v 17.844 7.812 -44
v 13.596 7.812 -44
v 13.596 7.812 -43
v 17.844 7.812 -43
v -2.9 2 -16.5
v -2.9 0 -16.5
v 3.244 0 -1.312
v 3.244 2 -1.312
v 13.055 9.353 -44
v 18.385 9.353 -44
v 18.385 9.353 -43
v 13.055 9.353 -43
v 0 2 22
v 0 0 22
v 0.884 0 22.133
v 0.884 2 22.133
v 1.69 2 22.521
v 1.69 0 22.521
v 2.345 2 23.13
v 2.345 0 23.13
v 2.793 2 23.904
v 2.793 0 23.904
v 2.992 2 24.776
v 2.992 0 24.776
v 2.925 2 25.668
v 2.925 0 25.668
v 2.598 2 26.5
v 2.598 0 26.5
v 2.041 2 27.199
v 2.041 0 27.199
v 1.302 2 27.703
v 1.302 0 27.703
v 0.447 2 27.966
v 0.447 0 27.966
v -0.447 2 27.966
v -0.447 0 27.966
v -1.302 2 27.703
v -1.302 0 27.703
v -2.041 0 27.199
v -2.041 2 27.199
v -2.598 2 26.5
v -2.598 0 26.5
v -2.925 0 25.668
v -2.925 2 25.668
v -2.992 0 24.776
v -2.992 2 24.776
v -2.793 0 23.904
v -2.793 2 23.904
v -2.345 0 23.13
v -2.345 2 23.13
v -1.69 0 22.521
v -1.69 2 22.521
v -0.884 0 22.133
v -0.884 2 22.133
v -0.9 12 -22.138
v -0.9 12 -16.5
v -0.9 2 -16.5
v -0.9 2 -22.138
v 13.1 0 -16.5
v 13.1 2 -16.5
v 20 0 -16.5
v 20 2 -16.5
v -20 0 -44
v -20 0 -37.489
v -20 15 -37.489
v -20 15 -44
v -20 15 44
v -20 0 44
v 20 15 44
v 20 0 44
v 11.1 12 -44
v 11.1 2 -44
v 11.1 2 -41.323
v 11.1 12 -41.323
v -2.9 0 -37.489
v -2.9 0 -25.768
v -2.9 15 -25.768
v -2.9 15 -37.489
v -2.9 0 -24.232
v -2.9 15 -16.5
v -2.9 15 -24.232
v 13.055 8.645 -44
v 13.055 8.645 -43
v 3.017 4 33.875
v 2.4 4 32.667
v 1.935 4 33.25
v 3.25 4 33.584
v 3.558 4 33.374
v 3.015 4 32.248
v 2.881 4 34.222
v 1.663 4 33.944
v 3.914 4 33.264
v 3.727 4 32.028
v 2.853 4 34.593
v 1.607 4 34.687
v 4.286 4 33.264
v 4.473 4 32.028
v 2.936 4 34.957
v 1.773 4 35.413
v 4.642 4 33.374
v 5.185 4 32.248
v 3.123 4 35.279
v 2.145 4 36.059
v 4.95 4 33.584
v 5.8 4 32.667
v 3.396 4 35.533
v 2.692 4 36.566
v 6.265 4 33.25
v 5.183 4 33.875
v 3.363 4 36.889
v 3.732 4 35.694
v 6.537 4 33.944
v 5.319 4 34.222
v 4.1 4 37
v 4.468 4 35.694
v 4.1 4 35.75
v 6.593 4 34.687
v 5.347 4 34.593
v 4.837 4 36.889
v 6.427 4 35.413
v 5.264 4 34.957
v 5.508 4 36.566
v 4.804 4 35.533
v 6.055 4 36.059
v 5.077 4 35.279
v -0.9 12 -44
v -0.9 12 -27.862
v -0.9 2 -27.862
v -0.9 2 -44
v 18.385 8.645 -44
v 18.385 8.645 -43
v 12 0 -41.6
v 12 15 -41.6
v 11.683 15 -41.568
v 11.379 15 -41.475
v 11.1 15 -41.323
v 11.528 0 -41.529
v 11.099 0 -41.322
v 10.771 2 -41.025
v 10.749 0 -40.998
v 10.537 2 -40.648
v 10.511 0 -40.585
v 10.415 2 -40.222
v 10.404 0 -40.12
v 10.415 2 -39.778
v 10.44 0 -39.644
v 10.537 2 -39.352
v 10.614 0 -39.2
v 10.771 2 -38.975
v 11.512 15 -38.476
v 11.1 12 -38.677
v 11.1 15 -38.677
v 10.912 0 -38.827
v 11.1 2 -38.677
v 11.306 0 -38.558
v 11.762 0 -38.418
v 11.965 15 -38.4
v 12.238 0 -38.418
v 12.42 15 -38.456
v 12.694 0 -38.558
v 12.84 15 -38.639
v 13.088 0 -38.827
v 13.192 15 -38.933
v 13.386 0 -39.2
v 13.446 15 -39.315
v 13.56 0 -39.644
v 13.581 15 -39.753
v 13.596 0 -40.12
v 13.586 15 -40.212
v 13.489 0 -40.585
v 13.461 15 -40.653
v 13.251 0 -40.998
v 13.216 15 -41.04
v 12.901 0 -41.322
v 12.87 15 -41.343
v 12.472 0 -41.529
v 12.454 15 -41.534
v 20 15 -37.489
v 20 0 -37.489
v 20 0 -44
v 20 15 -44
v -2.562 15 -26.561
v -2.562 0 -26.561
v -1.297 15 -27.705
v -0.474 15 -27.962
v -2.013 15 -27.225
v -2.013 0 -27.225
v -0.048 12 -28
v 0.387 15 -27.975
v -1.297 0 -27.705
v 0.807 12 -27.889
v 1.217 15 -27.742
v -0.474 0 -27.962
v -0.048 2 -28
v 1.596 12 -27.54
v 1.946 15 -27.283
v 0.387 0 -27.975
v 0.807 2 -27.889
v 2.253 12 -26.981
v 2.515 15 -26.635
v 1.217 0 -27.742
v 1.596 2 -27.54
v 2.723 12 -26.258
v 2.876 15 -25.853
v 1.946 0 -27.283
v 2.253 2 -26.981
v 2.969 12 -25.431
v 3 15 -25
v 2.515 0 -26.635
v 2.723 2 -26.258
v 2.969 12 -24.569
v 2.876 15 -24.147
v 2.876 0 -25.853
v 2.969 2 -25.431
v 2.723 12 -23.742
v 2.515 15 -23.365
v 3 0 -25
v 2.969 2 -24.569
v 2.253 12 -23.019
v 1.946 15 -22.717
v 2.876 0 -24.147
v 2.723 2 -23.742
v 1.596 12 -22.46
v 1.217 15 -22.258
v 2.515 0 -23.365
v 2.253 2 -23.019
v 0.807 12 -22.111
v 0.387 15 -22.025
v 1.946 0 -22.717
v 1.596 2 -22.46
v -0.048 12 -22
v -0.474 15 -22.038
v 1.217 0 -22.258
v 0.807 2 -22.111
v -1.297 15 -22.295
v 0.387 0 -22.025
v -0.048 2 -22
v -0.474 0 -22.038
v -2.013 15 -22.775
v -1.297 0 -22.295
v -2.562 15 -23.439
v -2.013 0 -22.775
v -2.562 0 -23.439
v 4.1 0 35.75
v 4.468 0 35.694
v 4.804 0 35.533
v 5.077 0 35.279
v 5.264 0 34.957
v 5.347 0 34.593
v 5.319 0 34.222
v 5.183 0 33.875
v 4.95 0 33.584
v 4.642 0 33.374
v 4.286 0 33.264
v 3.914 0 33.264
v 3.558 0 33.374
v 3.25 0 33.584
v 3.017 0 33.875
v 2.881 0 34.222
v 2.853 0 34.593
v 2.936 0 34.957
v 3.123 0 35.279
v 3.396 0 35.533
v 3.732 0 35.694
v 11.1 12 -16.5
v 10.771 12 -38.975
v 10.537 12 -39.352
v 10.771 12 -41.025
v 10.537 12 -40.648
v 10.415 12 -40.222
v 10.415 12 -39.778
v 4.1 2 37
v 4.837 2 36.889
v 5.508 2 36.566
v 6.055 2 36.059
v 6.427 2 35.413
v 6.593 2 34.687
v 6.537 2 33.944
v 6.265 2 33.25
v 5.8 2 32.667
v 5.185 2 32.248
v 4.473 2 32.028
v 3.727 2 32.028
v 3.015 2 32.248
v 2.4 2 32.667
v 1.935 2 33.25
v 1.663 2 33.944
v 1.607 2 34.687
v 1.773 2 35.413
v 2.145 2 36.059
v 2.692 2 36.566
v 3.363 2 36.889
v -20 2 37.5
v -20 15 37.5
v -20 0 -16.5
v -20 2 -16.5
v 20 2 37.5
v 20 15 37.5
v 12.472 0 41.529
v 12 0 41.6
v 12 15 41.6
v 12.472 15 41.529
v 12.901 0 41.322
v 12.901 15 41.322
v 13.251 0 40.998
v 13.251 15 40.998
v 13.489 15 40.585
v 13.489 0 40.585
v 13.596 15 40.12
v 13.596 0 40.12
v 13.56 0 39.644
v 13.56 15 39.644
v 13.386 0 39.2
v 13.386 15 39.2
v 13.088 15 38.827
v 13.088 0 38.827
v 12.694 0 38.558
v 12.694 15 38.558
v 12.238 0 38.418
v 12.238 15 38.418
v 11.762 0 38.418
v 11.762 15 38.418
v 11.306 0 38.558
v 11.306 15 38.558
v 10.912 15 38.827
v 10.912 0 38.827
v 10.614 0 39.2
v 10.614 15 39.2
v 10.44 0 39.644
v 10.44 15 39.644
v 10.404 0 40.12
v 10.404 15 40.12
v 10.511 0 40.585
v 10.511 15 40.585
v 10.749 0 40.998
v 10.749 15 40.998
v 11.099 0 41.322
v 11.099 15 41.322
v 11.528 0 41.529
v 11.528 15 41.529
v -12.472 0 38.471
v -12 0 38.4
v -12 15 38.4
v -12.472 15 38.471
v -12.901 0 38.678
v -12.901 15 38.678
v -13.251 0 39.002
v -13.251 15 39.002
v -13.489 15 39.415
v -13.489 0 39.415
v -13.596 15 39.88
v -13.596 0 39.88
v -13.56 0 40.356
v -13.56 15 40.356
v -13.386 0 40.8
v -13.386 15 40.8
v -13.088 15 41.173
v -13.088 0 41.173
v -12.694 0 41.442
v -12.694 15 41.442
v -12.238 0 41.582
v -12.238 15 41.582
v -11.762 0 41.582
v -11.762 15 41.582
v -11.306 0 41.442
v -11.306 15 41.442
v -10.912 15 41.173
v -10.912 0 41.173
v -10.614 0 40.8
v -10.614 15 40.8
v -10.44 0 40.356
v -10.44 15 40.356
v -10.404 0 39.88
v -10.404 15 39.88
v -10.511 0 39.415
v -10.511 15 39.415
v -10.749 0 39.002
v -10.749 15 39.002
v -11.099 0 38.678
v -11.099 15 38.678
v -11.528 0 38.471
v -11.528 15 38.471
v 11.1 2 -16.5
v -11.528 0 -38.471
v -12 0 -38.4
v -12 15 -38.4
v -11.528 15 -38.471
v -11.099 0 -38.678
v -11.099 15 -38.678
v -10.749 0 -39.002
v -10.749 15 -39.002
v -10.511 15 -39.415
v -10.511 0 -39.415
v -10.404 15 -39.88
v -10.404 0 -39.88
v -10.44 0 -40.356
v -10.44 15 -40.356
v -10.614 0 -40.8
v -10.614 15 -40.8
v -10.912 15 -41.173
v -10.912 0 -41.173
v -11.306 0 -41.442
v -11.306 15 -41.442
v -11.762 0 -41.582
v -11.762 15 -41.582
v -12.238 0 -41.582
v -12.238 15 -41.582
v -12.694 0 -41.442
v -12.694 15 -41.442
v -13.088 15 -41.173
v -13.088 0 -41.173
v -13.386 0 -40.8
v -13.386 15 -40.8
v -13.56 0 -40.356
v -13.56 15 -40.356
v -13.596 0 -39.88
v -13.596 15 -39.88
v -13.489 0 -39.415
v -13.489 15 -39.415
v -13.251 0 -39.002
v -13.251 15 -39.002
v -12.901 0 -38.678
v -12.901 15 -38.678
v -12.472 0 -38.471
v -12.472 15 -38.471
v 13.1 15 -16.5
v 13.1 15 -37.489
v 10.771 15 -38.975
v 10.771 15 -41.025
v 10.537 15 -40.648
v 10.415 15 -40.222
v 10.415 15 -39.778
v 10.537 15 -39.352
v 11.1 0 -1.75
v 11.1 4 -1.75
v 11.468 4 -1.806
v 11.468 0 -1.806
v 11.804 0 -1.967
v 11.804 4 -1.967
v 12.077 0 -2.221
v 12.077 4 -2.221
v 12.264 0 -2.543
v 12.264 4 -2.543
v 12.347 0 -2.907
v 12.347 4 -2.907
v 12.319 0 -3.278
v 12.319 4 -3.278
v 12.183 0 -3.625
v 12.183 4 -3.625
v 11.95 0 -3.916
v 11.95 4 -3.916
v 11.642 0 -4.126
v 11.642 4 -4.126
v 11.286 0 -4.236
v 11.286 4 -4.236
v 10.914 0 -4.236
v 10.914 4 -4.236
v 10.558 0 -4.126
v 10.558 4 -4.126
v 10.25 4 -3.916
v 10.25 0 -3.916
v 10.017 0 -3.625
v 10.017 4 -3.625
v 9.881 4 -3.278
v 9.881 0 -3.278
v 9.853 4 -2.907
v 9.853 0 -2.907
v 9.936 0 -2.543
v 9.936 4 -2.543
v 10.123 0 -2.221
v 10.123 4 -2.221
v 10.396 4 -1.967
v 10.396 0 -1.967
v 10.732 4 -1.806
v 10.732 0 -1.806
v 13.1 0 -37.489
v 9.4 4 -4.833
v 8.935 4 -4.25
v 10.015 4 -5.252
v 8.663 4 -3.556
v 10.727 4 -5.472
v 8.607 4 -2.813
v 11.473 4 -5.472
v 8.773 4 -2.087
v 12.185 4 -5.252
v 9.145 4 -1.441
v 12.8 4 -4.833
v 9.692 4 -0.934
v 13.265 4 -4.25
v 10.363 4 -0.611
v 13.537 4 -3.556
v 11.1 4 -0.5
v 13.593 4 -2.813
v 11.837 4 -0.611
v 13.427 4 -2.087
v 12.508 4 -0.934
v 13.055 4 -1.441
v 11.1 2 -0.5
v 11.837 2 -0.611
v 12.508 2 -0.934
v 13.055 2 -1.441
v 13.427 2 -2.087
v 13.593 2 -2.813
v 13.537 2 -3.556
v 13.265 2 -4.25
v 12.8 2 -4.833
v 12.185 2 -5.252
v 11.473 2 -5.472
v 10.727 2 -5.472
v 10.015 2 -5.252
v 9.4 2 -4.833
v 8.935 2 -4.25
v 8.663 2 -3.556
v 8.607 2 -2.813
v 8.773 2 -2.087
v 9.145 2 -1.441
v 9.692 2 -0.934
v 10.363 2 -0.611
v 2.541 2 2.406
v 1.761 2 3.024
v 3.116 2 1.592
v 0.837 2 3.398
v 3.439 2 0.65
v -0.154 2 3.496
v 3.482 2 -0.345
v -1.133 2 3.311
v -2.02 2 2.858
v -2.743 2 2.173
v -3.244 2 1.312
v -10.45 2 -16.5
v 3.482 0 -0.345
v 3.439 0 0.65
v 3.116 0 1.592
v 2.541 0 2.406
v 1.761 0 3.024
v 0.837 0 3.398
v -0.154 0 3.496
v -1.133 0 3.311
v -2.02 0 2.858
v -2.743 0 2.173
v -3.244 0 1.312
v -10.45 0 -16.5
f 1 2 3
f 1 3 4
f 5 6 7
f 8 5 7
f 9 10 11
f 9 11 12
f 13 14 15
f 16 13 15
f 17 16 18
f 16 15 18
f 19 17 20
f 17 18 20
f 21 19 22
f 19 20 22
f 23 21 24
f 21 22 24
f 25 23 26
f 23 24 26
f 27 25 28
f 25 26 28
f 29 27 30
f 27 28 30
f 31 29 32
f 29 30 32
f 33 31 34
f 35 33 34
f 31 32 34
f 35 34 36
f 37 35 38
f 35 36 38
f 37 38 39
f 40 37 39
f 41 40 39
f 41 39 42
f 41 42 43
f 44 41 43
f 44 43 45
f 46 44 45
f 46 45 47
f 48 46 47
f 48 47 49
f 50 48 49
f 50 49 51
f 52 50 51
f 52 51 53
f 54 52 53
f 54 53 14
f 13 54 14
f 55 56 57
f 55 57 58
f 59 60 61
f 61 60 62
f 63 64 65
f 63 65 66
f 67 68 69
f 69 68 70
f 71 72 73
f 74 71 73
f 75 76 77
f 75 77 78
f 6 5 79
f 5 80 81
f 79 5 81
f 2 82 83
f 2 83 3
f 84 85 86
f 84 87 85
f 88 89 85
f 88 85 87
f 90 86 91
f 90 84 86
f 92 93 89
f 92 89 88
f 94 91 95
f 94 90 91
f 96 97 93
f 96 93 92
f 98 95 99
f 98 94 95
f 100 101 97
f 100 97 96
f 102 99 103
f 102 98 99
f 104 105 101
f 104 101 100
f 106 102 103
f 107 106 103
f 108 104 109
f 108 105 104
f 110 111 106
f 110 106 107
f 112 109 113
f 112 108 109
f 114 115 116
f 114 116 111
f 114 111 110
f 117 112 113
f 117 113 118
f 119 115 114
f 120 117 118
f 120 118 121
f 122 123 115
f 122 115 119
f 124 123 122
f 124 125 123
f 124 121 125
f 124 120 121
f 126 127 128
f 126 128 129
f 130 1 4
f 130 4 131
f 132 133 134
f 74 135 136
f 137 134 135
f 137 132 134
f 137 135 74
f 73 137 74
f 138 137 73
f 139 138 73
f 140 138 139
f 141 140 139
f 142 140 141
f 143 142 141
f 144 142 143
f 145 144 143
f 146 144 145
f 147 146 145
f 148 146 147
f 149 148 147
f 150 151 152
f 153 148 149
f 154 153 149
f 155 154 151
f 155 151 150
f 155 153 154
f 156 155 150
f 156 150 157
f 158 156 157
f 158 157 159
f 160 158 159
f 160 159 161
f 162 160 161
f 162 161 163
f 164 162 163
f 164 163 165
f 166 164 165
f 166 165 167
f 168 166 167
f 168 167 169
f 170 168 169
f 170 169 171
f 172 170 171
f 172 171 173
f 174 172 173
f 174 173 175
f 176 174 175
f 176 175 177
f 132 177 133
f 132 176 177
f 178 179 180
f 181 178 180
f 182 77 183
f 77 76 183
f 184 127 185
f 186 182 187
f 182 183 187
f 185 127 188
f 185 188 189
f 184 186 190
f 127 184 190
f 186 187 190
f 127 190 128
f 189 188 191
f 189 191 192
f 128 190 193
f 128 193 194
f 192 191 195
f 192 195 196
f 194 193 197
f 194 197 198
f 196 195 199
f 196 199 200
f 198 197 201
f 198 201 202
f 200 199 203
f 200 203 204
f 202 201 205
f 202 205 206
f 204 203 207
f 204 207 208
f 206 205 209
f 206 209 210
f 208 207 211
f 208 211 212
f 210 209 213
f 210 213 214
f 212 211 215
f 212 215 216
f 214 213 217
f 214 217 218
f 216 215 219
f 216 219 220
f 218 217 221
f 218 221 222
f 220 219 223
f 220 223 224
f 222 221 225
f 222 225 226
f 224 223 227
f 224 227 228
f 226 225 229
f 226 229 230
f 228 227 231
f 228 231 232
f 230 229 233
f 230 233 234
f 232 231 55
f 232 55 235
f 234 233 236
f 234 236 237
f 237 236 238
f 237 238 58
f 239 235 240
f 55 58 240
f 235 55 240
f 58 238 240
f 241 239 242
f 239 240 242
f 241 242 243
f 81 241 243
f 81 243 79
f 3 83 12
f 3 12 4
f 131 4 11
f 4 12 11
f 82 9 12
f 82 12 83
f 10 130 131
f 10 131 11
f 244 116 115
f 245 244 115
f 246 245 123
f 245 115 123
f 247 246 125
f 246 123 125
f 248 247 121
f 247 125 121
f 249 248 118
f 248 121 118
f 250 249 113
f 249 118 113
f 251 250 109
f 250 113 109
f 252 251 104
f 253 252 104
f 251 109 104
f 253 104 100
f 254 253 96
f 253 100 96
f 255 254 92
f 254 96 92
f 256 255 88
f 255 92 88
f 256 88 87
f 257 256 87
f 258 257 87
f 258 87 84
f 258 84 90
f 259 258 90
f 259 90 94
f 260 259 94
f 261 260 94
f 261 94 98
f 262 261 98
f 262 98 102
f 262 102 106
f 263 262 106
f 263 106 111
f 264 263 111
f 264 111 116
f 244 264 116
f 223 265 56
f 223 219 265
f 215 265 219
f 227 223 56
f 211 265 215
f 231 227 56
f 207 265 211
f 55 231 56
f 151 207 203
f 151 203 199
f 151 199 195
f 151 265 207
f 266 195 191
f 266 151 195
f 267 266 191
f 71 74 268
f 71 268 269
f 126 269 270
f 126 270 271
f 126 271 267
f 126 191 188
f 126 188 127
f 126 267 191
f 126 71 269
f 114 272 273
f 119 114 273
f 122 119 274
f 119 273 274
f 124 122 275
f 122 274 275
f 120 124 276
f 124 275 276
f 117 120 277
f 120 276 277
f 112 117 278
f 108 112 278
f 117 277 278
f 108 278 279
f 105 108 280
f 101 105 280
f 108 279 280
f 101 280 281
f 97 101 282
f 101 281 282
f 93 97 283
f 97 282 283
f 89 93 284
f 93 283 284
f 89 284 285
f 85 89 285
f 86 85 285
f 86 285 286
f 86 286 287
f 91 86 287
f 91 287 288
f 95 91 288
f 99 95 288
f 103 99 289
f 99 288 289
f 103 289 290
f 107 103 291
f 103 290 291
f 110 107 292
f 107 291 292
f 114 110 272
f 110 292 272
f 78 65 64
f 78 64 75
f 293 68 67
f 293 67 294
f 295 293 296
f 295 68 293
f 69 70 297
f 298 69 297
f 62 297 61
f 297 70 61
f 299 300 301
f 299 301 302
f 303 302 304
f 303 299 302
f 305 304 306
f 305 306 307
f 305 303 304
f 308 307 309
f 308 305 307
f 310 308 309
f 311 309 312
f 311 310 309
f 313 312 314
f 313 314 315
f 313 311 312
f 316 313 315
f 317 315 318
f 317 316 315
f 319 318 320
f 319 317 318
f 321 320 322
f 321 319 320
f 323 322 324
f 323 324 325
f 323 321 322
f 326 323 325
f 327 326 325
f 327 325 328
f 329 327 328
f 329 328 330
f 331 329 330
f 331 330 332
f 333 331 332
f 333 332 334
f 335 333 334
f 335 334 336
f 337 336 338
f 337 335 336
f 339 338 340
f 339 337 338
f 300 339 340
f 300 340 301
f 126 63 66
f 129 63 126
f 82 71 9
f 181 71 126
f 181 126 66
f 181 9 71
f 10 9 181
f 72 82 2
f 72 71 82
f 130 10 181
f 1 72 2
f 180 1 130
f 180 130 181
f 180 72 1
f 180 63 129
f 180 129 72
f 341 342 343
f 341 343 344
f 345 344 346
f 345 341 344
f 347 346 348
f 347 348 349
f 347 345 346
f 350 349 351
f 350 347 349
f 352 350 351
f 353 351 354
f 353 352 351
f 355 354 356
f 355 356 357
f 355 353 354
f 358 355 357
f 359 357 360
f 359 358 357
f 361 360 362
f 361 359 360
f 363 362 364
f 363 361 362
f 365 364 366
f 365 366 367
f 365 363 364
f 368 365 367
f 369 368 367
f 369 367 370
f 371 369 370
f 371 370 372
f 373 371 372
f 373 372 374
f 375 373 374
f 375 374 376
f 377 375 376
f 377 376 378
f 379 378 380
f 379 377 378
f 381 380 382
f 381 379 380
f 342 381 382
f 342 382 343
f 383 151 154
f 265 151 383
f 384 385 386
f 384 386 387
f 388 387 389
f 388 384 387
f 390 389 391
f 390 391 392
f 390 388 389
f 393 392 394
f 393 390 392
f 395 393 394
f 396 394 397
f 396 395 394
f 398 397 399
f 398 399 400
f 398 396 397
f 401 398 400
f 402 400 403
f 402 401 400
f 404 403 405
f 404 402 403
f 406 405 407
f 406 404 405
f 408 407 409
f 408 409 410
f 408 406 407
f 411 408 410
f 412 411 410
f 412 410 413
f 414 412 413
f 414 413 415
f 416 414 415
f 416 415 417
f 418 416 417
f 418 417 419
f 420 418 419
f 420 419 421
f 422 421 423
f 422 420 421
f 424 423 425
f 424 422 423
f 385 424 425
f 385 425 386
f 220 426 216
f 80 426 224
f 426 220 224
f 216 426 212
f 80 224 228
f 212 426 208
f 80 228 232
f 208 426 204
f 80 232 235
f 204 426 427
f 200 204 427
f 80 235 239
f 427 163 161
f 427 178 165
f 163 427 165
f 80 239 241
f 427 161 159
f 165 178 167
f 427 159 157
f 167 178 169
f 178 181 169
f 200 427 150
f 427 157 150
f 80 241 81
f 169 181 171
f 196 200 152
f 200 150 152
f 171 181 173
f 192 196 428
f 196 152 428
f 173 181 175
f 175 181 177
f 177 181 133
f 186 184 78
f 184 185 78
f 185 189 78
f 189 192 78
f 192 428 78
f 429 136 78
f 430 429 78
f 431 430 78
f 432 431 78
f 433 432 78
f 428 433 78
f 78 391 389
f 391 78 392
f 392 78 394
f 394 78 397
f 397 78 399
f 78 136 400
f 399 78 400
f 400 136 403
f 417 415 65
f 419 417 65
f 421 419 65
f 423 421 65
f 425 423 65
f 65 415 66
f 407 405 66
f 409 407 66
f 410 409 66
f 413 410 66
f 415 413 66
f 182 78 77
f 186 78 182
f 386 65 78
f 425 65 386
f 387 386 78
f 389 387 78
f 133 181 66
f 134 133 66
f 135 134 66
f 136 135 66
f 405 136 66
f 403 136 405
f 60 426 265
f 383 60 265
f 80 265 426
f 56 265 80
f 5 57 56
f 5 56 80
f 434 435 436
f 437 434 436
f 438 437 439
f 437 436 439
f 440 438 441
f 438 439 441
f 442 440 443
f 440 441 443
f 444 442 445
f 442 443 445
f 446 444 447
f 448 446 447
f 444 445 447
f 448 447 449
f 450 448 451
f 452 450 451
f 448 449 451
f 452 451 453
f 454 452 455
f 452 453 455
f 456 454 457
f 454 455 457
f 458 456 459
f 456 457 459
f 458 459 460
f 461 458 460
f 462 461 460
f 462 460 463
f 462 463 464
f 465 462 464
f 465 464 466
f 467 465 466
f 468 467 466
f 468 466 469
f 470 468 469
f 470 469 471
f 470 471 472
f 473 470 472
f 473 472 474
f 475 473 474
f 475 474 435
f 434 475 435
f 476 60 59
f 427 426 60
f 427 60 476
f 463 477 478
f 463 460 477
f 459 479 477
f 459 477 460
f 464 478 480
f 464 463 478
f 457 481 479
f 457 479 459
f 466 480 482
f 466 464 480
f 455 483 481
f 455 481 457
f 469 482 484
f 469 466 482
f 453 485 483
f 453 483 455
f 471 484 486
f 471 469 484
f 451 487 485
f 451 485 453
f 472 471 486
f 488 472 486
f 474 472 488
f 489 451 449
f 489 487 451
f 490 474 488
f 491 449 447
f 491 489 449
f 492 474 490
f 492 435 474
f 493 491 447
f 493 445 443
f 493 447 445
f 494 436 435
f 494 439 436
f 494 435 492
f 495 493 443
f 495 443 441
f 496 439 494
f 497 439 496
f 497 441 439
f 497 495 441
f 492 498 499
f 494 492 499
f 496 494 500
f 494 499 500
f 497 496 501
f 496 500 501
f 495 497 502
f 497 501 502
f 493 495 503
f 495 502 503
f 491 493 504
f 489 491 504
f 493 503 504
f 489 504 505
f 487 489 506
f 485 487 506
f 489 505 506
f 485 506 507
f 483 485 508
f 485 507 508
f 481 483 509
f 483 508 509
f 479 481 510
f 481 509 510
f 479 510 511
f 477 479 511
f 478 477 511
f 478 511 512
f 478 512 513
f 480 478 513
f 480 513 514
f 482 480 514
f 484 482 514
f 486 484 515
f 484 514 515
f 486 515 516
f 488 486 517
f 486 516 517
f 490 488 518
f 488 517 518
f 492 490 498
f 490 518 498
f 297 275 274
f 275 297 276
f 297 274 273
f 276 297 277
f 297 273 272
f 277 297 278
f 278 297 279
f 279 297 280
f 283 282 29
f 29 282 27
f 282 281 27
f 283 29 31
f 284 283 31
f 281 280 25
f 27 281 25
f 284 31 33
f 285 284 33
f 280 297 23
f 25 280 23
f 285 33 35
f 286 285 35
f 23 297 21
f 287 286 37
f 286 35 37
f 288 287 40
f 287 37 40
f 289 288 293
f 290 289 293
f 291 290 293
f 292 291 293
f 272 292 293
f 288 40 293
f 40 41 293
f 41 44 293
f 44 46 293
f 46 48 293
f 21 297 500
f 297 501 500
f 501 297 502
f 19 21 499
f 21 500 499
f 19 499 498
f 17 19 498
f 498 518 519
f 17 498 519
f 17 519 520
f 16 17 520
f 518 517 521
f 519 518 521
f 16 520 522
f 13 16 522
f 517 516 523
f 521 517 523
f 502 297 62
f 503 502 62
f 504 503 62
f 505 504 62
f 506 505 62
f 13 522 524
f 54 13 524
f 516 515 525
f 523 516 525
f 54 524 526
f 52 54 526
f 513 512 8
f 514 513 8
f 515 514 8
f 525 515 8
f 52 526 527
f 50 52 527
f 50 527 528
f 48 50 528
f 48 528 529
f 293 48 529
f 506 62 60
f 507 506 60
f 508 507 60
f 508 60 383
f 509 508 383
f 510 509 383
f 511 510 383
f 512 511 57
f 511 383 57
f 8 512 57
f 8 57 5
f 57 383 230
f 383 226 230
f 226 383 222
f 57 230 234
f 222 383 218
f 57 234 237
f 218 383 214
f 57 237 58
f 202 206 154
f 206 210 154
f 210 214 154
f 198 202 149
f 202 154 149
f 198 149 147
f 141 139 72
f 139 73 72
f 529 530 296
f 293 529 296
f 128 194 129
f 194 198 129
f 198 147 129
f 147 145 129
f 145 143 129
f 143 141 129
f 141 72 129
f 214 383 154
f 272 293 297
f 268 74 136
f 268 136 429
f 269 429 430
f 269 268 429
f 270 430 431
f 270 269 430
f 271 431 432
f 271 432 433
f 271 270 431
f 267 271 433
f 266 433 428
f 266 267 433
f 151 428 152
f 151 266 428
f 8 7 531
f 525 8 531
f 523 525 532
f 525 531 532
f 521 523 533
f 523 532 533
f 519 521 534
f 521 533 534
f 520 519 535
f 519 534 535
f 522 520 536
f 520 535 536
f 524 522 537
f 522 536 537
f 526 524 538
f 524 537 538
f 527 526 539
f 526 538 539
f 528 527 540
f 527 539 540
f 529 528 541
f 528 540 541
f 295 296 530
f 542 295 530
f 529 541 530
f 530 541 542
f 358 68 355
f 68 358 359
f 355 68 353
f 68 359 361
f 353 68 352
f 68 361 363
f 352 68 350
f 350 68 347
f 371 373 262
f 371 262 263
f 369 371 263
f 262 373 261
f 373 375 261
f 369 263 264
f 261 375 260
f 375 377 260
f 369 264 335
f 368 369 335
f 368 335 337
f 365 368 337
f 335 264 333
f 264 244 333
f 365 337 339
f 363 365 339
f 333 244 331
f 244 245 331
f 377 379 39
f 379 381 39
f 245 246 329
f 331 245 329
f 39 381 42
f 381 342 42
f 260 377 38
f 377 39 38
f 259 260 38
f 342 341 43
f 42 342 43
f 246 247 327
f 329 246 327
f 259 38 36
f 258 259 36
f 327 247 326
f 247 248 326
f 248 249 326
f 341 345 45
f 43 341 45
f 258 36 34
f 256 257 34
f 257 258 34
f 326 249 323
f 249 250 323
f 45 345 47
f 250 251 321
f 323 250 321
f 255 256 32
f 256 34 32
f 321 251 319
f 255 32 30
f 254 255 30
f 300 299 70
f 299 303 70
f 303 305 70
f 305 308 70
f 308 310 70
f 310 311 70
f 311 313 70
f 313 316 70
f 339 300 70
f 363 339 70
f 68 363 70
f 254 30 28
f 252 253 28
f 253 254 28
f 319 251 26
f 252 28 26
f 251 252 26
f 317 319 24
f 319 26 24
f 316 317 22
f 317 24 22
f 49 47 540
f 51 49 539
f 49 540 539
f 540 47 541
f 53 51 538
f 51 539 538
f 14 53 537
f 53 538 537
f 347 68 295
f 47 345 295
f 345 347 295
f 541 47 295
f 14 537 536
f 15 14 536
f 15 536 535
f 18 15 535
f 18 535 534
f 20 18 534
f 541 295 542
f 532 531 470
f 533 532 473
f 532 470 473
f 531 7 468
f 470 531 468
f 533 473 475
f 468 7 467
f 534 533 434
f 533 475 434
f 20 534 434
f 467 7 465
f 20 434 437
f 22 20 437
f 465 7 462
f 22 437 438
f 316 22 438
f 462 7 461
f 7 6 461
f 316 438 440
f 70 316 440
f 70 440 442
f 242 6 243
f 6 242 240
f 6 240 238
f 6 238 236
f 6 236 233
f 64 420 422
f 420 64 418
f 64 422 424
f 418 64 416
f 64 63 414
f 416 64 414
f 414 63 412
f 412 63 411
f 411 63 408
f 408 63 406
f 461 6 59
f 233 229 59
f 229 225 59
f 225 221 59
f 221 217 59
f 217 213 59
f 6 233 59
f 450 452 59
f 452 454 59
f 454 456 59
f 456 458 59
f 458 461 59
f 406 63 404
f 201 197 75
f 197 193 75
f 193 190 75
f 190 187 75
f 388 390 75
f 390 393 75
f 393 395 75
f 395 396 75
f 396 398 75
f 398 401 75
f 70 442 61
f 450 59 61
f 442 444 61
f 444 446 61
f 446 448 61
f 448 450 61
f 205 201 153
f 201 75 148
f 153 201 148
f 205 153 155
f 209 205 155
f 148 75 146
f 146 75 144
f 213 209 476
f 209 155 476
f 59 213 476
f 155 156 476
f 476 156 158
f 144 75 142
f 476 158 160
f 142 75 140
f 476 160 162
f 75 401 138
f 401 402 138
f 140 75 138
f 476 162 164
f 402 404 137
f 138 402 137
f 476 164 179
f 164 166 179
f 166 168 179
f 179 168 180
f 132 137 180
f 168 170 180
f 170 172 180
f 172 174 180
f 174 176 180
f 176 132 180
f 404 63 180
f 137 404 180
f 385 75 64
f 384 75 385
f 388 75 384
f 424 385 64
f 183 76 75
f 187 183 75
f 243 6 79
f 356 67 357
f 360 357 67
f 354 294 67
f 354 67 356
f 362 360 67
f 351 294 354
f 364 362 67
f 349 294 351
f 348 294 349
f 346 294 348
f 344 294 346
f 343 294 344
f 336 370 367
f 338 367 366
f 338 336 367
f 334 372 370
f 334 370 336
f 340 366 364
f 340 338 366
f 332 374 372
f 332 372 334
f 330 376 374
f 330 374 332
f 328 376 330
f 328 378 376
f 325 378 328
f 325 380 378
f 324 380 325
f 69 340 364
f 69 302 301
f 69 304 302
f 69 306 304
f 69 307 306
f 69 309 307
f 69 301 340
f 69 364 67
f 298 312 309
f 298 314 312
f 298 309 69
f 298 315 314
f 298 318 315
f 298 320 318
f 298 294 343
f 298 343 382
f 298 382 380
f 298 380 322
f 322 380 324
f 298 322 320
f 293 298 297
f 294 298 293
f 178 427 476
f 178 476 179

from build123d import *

# Parameters (mm, degrees)
CROQUIS1_W              = 40
CROQUIS1_H              = 88
CROQUIS1_R              = 1.6
SALIENTE_EXTRUIR1_DEPTH = 15
CORTAR_EXTRUIR1_DEPTH   = 13
CROQUIS3_R              = 2.5
SALIENTE_EXTRUIR3_DEPTH = 2
CROQUIS4_R              = 1.25
CORTAR_EXTRUIR2_DEPTH   = 50.568134926
CROQUIS5_W              = 17.1
CROQUIS5_H              = 20.988594156
CROQUIS5_W_2            = 6.9
CORTAR_EXTRUIR3_DEPTH   = 51.606323716
SALIENTE_EXTRUIR4_START = -3
SALIENTE_EXTRUIR4_DEPTH = 3
CORTAR_EXTRUIR4_DEPTH   = 1
CROQUIS8_R              = 3
CORTAR_EXTRUIR5_DEPTH   = 51.606323716


with BuildPart() as part:
    # Croquis1 → Saliente-Extruir1 (new body)
    with BuildSketch(Plane(origin=(0, 0, 0), x_dir=(1, 0, 0), z_dir=(0, 1, 0))):
        Rectangle(CROQUIS1_W, CROQUIS1_H)
        with Locations(Location((-12, 40, 0), (0, 0, 270))):
            Circle(CROQUIS1_R, mode=Mode.SUBTRACT)
        with Locations(Location((12, 40, 0), (0, 0, 90))):
            Circle(CROQUIS1_R, mode=Mode.SUBTRACT)
        with Locations(Location((-12, -40, 0), (0, 0, 90))):
            Circle(CROQUIS1_R, mode=Mode.SUBTRACT)
        with Locations(Location((12, -40, 0), (0, 0, 270))):
            Circle(CROQUIS1_R, mode=Mode.SUBTRACT)
    extrude(amount=SALIENTE_EXTRUIR1_DEPTH)

    # Croquis2 → Cortar-Extruir1 (cut)
    with BuildSketch(Plane(origin=(0, 15, 0), x_dir=(1, 0, 0), z_dir=(0, 1, 0))):
        Polygon((-0.9, 48.396555715), (11.1, 48.396555715), (11.1, 16.5), (20, 16.5), (20, -37.5), (-20, -37.5), (-20, 16.5), (-0.9, 16.5), align=None)
    extrude(amount=-CORTAR_EXTRUIR1_DEPTH, mode=Mode.SUBTRACT)

    # Croquis3 → Saliente-Extruir3 (add)
    with BuildSketch(Plane(origin=(0, 2, 0), x_dir=(1, 0, 0), z_dir=(0, 1, 0))):
        with Locations(Location((11.1, 3, 0), (0, 0, 270))):
            Circle(CROQUIS3_R)
        with Locations(Location((4.1, -34.5, 0), (0, 0, 270))):
            Circle(CROQUIS3_R)
    extrude(amount=SALIENTE_EXTRUIR3_DEPTH)

    # Croquis4 → Cortar-Extruir2 (cut, through all)
    with BuildSketch(Plane(origin=(0, 4, 0), x_dir=(1, 0, 0), z_dir=(0, 1, 0))):
        with Locations(Location((11.1, 3, 0), (0, 0, 270))):
            Circle(CROQUIS4_R)
        with Locations(Location((4.1, -34.5, 0), (0, 0, 270))):
            Circle(CROQUIS4_R)
    extrude(amount=-CORTAR_EXTRUIR2_DEPTH, mode=Mode.SUBTRACT)

    # Croquis5 → Cortar-Extruir3 (cut, through all)
    with BuildSketch(Plane(origin=(0, 15, 0), x_dir=(1, 0, 0), z_dir=(0, 1, 0))):
        with Locations((-11.45, 26.994297078)):
            Rectangle(CROQUIS5_W, CROQUIS5_H)
        with Locations((16.55, 26.994297078)):
            Rectangle(CROQUIS5_W_2, CROQUIS5_H)
    extrude(amount=-CORTAR_EXTRUIR3_DEPTH, mode=Mode.SUBTRACT)

    # Croquis6 → Saliente-Extruir4 (add)
    with BuildSketch(Plane(origin=(0, 15, 0), x_dir=(1, 0, 0), z_dir=(0, 1, 0)).offset(SALIENTE_EXTRUIR4_START)):
        with BuildLine():
            Line((11.1, 44), (11.1, 41.322875656))
            ThreePointArc((11.1, 41.322875656), (10.4, 40), (11.1, 38.677124344))
            Line((11.1, 38.677124344), (11.1, 16.5))
            Line((11.1, 16.5), (-0.9, 16.5))
            Line((-0.9, 16.5), (-0.9, 44))
            Line((-0.9, 44), (11.1, 44))
        make_face()
    extrude(amount=SALIENTE_EXTRUIR4_DEPTH)

    # Croquis7 → Cortar-Extruir4 (cut)
    with BuildSketch(Plane(origin=(0, 0, -44), x_dir=(-1, 0, 0), z_dir=(0, 0, -1))):
        Polygon((-18.385000464, 9.353074792), (-13.054807804, 9.353074792), (-13.054807804, 8.645158579), (-13.596155496, 7.812315976), (-17.843652772, 7.812315976), (-18.385000464, 8.645158579), align=None)
    extrude(amount=-CORTAR_EXTRUIR4_DEPTH, mode=Mode.SUBTRACT)

    # Croquis8 → Cortar-Extruir5 (cut, through all)
    with BuildSketch(Plane.XZ):
        with Locations(Location((0, 25, 0), (0, 0, 270))):
            Circle(CROQUIS8_R)
        with Locations((0, -25)):
            Circle(CROQUIS8_R)
        with BuildLine():
            Line((-2.9, -16.5), (3.244083024, -1.312379042))
            ThreePointArc((3.244083024, -1.312379042), (1.312379042, 3.244083024), (-3.244083024, 1.312379042))
            Line((-3.244083024, 1.312379042), (-10.45, -16.5))
            Line((-10.45, -16.5), (-2.9, -16.5))
        make_face()
    extrude(amount=-CORTAR_EXTRUIR5_DEPTH, mode=Mode.SUBTRACT)


solid = part.part
